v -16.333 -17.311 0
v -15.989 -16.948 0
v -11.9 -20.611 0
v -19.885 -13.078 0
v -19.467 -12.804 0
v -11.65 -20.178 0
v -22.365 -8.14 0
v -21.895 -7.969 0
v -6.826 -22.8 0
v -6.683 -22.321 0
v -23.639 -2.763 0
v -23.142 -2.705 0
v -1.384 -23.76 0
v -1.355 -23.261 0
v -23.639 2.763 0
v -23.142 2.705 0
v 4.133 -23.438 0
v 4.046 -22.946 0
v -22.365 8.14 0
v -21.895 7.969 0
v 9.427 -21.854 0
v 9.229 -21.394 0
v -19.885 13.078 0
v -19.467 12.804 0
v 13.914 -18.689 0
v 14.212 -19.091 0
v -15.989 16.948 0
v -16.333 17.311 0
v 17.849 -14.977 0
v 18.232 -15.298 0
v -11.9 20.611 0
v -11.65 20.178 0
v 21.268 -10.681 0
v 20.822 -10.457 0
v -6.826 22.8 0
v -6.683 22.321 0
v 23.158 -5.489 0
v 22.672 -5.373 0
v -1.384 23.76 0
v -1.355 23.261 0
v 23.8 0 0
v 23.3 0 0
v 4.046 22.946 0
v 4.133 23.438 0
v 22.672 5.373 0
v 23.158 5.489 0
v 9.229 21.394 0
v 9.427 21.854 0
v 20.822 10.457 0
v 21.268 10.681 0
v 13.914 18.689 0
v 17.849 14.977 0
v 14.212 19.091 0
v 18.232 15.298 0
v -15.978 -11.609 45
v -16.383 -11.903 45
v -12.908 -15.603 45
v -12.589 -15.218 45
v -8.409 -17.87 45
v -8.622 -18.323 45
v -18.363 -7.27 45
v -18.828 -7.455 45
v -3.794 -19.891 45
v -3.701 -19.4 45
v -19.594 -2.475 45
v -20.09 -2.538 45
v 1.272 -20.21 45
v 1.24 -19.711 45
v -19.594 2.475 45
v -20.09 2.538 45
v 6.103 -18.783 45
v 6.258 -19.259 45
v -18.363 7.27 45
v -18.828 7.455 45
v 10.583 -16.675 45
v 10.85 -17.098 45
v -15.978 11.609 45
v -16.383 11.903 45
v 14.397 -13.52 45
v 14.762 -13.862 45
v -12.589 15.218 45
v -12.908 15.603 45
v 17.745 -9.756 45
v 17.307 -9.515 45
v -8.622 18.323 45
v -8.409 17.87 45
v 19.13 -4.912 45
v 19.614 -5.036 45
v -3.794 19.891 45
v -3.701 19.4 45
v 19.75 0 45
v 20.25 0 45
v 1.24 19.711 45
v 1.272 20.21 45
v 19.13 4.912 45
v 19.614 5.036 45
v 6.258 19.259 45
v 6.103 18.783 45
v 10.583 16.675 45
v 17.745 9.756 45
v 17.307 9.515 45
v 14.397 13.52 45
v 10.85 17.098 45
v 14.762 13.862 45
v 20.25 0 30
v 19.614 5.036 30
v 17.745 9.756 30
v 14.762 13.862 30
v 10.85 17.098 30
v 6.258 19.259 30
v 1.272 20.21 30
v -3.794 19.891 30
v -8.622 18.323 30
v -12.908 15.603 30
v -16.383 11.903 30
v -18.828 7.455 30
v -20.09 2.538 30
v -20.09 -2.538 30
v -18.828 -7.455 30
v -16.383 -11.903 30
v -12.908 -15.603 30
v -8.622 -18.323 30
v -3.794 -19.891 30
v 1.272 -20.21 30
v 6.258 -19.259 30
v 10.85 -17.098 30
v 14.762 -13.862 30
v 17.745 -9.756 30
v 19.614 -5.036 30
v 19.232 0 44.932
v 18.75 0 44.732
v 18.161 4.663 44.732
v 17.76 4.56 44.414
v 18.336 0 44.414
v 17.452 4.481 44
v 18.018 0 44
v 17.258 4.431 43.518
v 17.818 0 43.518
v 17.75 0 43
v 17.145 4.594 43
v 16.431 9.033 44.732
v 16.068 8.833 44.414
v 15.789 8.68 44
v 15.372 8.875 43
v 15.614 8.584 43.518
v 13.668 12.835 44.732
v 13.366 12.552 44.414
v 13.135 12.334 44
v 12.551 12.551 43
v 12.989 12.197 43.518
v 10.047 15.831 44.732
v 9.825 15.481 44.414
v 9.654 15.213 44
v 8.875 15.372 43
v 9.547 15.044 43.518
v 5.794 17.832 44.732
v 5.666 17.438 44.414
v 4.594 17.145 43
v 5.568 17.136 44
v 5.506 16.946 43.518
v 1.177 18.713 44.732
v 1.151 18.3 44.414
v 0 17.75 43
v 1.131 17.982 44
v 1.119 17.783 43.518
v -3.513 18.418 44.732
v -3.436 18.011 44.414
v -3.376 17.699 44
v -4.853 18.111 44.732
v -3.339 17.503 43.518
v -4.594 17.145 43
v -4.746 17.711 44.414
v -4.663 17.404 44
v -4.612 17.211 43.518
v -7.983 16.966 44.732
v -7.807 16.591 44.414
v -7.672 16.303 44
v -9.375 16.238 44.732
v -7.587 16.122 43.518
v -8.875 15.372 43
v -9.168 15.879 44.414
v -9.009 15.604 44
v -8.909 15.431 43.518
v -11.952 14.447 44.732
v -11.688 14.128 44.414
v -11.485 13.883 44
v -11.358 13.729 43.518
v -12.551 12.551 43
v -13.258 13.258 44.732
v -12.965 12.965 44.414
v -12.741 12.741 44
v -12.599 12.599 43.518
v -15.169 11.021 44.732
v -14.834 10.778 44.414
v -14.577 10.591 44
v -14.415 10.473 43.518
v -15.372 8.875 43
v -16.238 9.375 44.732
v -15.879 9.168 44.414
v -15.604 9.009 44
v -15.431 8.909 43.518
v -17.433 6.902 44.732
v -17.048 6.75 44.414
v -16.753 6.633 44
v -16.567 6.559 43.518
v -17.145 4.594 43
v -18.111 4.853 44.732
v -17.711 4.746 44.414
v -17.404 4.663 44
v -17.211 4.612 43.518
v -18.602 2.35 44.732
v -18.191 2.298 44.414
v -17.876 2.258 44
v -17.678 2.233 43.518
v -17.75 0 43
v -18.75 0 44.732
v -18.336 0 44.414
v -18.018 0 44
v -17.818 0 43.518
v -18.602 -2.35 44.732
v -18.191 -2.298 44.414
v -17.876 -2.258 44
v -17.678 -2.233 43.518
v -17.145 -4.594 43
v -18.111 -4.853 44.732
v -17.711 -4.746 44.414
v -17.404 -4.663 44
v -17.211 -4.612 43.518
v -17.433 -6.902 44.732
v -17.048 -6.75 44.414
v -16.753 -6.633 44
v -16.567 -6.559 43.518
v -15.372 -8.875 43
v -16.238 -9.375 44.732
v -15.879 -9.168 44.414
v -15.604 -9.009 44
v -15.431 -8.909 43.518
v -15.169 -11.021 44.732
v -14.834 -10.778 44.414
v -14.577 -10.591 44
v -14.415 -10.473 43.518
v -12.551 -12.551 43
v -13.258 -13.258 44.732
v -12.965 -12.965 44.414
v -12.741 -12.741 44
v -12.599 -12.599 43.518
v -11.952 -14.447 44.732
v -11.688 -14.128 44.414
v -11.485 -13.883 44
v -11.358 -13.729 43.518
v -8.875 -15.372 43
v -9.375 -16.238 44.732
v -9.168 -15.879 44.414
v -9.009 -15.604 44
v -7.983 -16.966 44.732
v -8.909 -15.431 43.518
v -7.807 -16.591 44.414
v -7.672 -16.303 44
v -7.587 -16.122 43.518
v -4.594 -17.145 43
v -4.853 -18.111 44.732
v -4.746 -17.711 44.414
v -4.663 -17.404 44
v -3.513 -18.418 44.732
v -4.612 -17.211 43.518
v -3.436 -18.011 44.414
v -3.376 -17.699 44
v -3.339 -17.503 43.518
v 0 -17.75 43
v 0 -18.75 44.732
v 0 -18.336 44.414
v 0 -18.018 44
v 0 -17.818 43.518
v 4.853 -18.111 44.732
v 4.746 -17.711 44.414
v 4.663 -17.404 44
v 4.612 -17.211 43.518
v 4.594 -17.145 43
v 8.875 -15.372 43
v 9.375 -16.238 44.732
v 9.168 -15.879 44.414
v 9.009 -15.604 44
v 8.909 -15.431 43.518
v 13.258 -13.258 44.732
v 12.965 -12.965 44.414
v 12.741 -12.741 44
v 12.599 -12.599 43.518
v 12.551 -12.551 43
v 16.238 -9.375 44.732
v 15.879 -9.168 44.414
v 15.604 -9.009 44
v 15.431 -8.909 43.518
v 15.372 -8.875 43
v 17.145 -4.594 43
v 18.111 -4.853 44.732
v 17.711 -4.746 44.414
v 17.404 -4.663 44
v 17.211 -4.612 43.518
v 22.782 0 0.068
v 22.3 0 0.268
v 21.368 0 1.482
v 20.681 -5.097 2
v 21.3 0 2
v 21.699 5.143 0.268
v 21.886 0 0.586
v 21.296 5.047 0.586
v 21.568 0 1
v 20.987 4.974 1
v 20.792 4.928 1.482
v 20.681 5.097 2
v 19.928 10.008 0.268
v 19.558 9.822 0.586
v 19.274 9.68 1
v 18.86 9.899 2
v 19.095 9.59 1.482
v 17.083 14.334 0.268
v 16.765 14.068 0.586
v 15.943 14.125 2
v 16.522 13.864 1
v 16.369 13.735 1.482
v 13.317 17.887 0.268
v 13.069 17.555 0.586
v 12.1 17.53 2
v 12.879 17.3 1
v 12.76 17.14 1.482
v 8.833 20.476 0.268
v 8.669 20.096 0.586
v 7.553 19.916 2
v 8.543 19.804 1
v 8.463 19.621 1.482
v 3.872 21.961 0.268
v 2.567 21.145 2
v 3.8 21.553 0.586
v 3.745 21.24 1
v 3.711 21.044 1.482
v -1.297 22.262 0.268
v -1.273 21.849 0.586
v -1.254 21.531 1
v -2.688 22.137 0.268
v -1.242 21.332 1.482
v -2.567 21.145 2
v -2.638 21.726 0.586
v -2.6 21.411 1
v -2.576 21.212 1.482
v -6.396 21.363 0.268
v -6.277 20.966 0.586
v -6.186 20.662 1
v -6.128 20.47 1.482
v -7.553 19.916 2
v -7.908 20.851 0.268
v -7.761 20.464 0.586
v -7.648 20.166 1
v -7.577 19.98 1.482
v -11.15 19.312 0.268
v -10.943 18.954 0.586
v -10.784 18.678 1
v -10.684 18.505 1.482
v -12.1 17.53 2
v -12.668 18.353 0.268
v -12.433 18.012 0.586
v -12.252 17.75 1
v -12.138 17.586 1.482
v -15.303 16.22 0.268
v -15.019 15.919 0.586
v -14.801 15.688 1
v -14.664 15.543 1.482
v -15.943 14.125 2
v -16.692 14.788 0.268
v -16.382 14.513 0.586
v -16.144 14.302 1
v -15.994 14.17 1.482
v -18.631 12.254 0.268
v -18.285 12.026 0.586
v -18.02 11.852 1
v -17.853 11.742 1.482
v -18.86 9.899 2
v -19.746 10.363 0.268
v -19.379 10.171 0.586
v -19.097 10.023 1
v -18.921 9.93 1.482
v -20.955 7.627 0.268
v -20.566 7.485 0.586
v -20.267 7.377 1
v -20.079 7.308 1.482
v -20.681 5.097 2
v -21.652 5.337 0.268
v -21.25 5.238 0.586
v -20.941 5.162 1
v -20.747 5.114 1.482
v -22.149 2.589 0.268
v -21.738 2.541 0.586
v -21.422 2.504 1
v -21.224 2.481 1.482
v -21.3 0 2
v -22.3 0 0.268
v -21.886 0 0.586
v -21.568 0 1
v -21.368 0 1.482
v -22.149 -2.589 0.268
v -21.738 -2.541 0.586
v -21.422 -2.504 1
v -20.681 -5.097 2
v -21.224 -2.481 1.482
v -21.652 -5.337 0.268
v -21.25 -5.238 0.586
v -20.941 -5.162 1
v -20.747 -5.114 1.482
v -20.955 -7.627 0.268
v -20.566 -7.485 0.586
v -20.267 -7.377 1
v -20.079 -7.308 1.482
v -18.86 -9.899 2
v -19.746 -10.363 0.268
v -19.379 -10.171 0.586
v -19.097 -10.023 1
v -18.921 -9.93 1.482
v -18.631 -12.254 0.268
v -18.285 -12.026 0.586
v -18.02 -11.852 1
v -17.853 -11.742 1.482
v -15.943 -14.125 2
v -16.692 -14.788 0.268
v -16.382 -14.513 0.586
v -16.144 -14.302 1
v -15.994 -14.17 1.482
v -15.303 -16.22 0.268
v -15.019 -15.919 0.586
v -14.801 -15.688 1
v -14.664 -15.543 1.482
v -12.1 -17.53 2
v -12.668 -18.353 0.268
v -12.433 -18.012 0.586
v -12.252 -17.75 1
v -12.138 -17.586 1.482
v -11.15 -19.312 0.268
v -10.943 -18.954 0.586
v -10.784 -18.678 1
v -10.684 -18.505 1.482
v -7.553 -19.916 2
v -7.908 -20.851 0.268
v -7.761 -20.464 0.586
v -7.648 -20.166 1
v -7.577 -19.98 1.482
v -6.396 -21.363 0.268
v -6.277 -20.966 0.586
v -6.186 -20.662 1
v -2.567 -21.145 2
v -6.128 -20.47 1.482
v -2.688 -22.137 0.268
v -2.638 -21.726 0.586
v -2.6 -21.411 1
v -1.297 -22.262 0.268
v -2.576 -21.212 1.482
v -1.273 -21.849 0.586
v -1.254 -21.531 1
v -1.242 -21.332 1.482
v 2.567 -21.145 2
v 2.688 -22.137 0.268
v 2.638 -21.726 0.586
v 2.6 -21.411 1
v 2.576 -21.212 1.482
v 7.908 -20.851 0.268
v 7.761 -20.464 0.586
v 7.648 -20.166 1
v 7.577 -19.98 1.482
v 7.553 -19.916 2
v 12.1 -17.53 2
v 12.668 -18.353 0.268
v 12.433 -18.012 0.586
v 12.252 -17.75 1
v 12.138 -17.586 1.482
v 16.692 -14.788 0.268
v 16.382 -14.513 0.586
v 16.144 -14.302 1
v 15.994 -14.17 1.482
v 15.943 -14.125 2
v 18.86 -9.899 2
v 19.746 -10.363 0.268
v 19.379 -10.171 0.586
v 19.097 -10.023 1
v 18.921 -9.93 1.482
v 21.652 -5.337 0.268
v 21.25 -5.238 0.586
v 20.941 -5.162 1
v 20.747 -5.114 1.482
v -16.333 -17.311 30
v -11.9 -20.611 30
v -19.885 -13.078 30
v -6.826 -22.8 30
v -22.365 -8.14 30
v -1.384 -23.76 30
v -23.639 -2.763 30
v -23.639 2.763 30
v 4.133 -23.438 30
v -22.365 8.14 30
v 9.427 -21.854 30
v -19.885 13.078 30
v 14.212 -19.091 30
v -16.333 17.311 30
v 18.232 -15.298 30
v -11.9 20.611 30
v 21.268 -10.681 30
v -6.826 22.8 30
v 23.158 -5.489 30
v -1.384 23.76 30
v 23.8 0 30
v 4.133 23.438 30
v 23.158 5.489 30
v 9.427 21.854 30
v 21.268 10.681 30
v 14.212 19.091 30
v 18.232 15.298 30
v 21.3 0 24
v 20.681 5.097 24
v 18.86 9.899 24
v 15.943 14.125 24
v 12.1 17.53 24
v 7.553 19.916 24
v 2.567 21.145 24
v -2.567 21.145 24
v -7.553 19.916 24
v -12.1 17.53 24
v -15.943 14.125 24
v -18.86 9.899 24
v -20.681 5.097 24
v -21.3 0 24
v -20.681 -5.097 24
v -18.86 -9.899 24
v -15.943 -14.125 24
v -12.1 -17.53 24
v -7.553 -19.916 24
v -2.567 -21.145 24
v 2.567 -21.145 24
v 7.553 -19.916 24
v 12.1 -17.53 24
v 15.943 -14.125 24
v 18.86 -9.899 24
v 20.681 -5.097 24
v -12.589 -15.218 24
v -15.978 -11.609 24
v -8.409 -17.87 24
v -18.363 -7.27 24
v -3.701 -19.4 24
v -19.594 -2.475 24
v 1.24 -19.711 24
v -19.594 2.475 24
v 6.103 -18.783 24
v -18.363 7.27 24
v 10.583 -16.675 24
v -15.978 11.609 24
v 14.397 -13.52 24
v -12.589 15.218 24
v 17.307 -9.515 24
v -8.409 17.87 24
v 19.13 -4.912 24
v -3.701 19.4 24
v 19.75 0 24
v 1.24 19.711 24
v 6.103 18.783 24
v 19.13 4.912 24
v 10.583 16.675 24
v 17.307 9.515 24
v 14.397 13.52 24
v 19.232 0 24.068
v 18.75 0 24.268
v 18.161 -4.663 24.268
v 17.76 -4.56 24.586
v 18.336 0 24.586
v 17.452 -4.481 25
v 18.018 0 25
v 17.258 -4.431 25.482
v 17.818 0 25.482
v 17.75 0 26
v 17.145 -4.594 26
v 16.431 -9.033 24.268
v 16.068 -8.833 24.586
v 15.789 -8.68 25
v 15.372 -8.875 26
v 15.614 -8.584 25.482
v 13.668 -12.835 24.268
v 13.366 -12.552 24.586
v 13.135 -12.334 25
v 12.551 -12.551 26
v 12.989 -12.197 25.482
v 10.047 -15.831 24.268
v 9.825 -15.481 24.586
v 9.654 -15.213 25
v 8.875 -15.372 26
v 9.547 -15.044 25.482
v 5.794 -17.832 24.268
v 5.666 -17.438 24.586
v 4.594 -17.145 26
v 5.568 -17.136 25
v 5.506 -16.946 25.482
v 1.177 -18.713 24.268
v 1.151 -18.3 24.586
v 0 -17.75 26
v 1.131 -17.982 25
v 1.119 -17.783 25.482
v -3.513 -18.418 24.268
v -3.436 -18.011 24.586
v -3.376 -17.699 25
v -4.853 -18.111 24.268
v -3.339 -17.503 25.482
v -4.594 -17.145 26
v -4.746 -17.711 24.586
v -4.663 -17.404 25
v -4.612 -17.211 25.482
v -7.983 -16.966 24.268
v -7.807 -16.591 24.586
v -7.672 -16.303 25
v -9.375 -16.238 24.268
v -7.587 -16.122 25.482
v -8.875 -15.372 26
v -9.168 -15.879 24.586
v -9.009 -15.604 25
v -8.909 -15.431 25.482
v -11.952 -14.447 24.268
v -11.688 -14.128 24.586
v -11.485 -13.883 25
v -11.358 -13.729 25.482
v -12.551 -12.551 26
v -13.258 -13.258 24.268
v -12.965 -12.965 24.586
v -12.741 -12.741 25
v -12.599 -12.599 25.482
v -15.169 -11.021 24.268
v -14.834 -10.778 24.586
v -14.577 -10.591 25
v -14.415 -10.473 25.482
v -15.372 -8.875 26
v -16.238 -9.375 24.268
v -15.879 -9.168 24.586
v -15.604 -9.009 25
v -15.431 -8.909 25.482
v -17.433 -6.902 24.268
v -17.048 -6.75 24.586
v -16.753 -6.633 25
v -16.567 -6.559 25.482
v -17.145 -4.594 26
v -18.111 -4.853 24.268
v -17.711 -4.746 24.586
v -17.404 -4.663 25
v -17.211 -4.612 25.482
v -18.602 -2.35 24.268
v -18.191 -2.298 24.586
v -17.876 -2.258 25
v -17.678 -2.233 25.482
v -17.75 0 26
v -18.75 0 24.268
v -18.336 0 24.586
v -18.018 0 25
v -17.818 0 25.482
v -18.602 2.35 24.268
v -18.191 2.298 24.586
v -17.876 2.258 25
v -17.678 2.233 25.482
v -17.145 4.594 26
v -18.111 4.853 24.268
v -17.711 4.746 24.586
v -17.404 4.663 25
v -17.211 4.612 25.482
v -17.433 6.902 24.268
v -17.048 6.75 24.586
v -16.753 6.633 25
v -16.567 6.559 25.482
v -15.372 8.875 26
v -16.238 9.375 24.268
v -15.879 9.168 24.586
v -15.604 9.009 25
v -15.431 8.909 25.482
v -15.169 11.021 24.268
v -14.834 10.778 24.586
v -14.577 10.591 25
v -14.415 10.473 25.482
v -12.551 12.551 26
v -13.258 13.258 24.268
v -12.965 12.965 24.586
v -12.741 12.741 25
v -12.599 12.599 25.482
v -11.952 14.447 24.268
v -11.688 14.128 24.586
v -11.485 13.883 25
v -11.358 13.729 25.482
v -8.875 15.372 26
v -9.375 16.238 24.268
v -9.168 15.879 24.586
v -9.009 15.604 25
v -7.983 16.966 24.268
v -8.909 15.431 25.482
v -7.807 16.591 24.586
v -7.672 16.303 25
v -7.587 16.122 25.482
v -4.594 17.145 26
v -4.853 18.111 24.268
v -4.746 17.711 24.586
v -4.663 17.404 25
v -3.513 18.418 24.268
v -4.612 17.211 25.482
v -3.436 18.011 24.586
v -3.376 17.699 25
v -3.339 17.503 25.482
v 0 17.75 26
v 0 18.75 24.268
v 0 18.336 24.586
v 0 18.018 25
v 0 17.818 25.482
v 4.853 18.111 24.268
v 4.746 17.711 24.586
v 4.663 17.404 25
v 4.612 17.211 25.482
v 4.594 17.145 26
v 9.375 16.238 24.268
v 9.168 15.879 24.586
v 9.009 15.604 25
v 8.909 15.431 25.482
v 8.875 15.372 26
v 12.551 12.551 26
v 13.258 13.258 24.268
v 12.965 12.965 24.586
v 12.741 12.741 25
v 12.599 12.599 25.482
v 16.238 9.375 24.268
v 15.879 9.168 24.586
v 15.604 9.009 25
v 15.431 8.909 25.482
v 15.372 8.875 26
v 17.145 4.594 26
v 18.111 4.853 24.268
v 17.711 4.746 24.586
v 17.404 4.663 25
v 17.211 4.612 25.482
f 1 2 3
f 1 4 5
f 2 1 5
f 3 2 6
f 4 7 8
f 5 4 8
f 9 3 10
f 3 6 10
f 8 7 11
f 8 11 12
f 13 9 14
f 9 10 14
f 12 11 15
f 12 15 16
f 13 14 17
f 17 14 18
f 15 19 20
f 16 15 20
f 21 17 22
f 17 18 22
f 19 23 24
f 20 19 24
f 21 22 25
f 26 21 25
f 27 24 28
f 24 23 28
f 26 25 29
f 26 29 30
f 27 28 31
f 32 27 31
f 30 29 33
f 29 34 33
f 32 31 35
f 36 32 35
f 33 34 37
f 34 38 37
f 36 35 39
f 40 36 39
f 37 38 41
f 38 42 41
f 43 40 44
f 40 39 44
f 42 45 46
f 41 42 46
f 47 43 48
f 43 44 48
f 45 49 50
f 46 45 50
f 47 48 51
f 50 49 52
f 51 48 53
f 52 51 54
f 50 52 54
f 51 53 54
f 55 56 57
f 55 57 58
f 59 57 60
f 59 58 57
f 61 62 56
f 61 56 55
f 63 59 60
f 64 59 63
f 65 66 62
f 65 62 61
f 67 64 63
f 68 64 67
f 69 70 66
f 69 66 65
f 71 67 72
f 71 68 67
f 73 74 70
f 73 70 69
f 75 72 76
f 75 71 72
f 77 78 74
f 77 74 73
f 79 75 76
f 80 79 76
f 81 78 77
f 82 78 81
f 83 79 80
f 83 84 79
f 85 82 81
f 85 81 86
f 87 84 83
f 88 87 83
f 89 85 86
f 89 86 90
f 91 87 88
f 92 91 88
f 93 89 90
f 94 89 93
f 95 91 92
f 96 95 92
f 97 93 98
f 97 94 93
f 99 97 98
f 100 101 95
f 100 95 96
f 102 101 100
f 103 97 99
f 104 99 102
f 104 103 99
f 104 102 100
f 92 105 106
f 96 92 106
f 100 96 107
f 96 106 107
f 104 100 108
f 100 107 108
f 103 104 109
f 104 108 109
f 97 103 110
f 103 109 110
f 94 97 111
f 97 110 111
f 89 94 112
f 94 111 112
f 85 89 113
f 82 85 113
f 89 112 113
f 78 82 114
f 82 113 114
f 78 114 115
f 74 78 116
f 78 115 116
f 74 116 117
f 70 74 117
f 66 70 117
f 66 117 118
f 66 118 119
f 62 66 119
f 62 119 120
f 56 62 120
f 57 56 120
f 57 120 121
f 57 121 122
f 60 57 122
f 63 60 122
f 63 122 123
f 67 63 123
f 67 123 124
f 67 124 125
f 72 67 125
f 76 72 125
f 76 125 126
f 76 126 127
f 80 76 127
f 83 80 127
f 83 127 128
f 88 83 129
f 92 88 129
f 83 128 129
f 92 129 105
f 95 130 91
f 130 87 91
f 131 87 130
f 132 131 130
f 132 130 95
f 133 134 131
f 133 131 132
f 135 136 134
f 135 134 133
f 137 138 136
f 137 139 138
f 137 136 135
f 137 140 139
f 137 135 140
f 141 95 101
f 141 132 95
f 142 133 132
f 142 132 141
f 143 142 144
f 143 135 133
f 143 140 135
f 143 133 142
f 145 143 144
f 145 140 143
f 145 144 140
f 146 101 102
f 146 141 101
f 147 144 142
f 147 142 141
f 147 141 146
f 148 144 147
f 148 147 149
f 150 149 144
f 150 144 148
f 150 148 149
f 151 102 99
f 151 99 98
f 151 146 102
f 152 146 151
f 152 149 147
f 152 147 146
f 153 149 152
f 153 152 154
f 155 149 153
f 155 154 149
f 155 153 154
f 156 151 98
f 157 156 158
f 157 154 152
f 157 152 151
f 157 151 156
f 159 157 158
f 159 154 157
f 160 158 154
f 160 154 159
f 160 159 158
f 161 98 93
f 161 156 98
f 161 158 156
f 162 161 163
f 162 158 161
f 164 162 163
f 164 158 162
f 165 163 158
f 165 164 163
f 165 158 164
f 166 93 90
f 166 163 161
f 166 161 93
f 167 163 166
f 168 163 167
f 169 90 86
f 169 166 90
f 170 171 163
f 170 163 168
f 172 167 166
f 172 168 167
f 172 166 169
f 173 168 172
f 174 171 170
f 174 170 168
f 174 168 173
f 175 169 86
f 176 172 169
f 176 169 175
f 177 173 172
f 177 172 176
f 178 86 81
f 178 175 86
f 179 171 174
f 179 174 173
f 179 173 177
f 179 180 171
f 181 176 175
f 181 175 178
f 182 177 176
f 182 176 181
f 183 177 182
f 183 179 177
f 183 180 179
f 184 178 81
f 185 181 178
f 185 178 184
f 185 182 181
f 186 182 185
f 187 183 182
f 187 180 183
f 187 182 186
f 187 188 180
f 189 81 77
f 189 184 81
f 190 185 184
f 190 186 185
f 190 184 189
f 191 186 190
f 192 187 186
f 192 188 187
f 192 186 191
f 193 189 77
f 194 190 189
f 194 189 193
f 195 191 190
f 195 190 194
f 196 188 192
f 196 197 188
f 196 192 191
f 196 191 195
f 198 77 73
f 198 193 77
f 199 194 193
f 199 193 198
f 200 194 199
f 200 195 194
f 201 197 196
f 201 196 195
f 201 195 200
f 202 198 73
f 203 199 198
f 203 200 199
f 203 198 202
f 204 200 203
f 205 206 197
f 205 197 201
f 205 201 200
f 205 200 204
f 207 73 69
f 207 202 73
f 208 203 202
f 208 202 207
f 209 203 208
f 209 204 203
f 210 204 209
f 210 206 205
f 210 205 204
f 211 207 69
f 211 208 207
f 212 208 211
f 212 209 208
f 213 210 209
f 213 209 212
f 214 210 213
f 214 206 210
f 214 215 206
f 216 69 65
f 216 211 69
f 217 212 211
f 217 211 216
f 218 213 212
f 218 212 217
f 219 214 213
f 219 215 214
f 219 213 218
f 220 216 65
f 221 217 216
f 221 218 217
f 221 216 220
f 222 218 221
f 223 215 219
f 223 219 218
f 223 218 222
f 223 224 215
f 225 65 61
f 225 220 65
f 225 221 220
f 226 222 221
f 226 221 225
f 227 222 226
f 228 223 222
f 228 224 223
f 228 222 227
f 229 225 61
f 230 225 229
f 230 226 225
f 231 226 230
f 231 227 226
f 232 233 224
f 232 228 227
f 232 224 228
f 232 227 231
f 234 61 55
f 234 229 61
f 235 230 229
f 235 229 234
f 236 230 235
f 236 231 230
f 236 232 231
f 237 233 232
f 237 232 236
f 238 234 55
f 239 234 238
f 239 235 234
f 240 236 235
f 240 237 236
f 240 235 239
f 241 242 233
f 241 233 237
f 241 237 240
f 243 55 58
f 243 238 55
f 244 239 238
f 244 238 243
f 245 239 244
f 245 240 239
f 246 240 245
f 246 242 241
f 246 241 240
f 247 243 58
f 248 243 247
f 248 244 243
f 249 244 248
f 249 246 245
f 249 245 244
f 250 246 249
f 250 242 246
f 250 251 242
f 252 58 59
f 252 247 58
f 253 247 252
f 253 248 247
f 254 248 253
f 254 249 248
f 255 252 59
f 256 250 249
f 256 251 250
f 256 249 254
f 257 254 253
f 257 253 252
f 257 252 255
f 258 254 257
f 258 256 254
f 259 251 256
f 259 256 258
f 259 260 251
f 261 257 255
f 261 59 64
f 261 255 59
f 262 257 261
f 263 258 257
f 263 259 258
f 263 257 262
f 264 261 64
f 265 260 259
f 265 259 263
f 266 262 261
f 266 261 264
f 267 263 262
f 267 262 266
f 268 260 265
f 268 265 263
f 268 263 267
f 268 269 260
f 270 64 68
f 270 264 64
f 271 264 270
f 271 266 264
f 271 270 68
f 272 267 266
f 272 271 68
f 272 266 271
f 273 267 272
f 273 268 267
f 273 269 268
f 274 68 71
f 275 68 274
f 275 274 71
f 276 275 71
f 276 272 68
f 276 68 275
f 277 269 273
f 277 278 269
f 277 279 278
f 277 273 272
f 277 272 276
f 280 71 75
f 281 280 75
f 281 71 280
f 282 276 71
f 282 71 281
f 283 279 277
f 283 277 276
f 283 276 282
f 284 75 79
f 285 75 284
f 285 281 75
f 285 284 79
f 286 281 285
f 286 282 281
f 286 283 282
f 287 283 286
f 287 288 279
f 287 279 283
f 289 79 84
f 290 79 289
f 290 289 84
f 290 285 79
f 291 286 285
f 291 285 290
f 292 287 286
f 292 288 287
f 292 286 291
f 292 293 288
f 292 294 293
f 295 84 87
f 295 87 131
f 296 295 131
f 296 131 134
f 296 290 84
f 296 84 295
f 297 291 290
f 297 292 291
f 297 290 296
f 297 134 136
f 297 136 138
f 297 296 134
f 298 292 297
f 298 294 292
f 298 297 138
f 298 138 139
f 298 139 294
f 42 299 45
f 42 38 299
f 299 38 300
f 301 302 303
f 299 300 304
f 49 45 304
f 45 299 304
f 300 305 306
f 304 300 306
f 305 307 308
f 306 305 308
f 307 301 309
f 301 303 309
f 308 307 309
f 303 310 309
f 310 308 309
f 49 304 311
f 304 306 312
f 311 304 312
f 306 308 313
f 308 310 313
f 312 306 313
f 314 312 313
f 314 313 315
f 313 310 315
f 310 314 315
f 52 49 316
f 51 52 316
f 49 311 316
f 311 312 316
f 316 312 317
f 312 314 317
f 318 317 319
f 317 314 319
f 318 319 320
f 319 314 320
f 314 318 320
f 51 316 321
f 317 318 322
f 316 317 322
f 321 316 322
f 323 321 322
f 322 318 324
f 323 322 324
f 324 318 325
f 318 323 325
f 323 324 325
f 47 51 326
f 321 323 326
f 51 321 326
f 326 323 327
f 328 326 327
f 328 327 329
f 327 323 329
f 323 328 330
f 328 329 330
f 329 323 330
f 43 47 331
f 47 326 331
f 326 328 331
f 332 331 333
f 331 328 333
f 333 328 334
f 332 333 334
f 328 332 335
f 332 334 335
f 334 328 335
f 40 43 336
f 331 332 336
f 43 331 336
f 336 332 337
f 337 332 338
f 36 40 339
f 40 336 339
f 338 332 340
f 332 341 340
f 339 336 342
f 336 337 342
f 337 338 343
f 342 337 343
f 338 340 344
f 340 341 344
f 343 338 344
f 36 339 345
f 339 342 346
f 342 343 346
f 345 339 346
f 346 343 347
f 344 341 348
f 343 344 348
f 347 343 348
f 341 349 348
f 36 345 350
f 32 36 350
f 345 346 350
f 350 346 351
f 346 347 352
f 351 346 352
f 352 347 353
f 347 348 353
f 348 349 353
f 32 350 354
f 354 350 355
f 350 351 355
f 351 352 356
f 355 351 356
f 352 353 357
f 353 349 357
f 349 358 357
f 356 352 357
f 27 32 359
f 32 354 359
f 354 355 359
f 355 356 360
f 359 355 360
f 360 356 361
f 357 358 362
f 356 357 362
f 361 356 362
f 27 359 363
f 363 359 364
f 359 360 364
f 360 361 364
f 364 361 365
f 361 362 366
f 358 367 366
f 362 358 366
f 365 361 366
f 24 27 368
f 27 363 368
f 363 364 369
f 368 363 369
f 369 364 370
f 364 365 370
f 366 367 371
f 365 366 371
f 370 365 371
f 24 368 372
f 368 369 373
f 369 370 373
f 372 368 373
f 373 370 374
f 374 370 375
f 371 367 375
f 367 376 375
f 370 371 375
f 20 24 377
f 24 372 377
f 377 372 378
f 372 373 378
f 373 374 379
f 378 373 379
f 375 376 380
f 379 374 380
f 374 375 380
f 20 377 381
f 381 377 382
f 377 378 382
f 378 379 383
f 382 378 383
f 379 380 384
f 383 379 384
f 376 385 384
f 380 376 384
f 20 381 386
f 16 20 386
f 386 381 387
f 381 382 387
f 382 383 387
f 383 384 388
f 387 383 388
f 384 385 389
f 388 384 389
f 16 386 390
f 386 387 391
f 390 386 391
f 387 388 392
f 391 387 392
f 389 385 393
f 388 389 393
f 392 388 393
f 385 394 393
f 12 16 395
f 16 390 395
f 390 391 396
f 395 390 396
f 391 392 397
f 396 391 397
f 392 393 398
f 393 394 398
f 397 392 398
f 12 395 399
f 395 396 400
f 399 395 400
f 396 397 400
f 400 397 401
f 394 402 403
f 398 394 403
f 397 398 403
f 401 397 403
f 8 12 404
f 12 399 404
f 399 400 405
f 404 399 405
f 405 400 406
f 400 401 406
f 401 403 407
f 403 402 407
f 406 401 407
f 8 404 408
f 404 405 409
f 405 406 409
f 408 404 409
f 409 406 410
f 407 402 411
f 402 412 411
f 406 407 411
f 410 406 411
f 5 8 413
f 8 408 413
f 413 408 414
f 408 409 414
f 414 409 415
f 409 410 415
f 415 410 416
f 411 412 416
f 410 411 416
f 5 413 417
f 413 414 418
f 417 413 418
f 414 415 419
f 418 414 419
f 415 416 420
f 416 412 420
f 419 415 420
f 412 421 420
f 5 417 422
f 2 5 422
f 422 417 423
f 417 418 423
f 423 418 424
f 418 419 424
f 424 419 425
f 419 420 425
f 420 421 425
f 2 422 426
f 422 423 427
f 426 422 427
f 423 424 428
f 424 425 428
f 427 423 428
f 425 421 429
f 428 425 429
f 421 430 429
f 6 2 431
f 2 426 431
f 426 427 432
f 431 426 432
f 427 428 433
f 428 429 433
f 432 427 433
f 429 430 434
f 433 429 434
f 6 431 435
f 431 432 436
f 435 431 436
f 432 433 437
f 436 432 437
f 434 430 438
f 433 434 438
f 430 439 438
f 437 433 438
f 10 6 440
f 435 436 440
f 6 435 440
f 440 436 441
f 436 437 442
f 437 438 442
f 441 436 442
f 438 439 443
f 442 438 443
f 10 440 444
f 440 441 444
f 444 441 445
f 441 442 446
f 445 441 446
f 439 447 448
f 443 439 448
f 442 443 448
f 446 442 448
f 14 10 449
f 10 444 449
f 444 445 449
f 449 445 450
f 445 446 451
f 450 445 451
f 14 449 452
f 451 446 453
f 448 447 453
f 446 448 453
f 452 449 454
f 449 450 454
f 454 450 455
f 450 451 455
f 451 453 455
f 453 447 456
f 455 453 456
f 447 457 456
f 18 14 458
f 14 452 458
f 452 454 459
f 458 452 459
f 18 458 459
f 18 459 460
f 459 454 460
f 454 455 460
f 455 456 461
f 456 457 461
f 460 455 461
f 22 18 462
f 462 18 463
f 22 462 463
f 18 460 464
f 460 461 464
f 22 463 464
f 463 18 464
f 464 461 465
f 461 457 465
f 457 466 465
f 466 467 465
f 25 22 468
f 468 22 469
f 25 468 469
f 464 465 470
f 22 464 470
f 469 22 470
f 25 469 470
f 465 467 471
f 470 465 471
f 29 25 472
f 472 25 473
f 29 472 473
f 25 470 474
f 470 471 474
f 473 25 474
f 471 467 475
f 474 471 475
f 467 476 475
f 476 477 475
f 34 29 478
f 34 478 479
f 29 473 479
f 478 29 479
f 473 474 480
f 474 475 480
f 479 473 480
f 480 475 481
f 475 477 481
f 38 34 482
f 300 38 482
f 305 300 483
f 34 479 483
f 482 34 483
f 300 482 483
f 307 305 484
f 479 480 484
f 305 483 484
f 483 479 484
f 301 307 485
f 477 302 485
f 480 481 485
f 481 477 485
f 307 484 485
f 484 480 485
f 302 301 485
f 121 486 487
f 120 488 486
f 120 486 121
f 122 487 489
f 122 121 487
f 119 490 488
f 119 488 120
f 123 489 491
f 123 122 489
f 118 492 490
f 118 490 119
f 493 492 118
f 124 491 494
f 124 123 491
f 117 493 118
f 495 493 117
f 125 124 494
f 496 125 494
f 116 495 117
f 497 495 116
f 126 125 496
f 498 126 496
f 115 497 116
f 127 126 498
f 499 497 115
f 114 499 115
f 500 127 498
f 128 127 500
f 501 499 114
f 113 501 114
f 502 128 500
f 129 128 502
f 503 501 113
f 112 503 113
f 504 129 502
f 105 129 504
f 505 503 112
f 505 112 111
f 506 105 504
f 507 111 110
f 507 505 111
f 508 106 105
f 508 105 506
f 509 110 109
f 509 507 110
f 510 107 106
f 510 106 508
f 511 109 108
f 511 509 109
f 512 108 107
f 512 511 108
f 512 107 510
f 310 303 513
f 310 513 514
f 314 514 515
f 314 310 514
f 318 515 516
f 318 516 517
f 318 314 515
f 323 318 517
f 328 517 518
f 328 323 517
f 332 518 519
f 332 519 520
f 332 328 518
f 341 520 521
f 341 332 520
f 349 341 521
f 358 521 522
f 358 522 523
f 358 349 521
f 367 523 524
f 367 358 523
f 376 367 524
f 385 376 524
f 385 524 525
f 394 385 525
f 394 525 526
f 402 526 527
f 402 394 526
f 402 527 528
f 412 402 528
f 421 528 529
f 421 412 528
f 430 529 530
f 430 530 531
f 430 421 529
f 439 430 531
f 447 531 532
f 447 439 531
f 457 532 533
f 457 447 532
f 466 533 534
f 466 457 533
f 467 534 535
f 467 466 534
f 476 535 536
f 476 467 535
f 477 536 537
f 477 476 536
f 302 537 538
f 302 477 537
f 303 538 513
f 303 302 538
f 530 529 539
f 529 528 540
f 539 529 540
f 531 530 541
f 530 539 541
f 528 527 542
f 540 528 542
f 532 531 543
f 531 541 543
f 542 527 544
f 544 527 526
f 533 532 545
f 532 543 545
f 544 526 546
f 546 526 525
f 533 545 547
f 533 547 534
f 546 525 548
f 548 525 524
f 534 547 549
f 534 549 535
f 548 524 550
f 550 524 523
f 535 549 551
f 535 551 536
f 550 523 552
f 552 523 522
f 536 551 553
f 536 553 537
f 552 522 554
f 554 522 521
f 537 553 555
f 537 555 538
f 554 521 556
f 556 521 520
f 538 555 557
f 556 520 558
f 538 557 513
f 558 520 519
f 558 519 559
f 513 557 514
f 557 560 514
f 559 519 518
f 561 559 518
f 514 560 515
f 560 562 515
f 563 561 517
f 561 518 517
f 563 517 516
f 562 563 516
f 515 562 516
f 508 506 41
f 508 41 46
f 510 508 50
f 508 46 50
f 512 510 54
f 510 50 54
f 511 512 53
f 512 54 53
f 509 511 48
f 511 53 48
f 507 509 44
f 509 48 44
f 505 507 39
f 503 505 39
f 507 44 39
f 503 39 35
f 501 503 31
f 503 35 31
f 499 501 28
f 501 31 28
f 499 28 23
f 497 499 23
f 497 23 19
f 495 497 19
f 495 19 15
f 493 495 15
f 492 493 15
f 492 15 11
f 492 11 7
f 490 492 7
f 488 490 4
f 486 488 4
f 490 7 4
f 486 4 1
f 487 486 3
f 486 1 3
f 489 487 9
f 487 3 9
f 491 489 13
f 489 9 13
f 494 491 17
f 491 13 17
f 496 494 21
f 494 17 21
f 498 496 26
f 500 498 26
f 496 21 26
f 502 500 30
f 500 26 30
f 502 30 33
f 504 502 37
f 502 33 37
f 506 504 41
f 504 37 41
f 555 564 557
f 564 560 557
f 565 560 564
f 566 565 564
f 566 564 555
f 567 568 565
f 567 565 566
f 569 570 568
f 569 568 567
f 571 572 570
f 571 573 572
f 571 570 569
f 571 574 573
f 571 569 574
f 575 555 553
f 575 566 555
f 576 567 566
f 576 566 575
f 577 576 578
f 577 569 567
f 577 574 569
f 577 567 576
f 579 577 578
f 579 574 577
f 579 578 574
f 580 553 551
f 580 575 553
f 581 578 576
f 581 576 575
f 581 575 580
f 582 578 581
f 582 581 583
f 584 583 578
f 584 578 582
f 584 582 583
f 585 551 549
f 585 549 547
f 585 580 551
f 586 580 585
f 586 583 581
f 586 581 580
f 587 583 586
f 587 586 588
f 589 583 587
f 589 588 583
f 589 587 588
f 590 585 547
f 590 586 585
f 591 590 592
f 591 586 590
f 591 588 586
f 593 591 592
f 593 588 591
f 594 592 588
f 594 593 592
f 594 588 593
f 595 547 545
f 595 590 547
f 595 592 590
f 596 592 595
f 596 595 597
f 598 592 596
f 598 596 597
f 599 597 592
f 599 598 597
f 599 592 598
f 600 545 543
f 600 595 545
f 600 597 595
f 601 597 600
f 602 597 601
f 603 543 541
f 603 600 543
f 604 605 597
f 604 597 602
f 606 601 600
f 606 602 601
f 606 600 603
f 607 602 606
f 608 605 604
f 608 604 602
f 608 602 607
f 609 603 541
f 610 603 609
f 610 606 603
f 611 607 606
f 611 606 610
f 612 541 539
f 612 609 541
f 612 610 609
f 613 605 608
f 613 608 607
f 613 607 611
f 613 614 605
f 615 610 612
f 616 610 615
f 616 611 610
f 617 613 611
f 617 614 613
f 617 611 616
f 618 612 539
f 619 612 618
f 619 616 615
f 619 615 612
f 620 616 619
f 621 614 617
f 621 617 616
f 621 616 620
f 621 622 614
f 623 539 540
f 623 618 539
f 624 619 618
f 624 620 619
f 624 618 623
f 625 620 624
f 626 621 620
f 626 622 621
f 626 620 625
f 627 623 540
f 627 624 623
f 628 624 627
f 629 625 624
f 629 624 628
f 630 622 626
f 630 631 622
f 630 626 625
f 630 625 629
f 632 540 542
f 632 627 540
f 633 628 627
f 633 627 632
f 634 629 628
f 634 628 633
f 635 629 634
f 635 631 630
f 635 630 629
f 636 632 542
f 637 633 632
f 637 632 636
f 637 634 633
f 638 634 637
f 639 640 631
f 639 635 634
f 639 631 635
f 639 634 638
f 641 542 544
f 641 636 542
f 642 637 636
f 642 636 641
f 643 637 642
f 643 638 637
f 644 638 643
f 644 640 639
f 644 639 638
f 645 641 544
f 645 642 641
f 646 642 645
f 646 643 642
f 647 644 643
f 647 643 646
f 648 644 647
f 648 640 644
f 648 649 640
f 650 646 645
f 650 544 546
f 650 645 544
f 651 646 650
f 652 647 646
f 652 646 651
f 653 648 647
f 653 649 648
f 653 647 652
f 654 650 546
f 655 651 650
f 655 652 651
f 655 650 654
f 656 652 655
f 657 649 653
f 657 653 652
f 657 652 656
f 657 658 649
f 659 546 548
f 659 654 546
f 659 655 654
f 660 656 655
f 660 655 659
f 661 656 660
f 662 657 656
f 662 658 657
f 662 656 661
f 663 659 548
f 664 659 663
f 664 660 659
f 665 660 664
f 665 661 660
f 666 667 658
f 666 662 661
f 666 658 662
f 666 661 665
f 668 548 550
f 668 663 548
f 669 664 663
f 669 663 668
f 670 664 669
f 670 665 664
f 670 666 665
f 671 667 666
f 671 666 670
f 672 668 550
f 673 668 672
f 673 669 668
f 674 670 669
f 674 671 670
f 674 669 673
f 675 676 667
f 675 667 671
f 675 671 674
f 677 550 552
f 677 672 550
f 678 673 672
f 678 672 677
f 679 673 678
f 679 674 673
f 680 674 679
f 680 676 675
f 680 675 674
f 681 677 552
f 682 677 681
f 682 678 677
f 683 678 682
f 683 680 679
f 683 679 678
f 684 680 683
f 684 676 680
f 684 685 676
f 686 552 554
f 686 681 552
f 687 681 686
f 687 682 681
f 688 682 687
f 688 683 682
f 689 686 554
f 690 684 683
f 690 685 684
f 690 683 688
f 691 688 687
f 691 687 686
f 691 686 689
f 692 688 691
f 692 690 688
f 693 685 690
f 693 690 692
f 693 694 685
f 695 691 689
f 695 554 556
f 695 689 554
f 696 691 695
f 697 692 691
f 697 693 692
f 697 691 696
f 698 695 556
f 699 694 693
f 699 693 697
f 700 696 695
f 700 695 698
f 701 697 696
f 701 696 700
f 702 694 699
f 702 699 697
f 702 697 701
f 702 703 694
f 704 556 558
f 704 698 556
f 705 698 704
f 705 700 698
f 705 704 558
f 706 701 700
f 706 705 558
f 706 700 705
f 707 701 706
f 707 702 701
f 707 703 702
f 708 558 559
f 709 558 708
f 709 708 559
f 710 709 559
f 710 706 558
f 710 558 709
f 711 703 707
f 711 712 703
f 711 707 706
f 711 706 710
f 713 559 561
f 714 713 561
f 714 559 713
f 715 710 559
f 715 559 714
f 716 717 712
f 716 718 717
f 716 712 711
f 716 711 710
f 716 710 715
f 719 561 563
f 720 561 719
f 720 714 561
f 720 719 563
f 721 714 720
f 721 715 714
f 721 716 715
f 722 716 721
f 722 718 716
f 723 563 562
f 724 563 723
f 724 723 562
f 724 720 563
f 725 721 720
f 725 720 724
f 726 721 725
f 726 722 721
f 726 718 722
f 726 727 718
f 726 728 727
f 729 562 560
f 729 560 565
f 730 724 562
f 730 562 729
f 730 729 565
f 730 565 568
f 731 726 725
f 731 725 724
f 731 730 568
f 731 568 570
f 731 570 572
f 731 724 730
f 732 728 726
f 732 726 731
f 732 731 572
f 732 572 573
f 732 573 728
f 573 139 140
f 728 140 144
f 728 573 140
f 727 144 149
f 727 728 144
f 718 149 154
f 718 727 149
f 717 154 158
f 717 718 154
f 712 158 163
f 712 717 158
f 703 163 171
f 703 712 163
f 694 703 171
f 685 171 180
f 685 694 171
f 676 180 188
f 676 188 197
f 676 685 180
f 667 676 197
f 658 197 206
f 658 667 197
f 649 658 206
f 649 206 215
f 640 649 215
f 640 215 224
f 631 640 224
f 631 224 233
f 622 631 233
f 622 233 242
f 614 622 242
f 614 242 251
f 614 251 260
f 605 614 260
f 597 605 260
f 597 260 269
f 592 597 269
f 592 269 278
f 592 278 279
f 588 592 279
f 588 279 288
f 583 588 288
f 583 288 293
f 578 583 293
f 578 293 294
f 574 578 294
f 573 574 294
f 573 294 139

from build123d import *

# Parameters (mm, degrees)
F0_R     = 20.25
F0_R_2   = 17.75
F1_DEPTH = 45
F0_R_3   = 23.8
F2_DEPTH = 30
F3_R     = 21.3
F4_DEPTH = 24
F5_R     = 2


with BuildPart() as f1:
    # F0 (on Top) → F1 (new body)
    with BuildSketch(Plane.XY):
        Circle(F0_R)
        Circle(F0_R_2, mode=Mode.SUBTRACT)
    extrude(amount=F1_DEPTH)

    # F0 (on Top) → F2 (join)
    with BuildSketch(Plane.XY):
        Circle(F0_R_3)
        Circle(F0_R, mode=Mode.SUBTRACT)
    extrude(amount=F2_DEPTH)

    # F3 (on Top) → F4 (cut)
    with BuildSketch(Plane.XY):
        Circle(F3_R)
    extrude(amount=F4_DEPTH, mode=Mode.SUBTRACT)

    # F5
    f5_edges = [f1.edges().sort_by_distance(p)[0] for p in [
        (-17.75, 0, 24),
        (-21.3, 0, 0),
        (-17.75, 0, 45),
    ]]
    fillet(f5_edges, radius=F5_R)


solid = f1.part
